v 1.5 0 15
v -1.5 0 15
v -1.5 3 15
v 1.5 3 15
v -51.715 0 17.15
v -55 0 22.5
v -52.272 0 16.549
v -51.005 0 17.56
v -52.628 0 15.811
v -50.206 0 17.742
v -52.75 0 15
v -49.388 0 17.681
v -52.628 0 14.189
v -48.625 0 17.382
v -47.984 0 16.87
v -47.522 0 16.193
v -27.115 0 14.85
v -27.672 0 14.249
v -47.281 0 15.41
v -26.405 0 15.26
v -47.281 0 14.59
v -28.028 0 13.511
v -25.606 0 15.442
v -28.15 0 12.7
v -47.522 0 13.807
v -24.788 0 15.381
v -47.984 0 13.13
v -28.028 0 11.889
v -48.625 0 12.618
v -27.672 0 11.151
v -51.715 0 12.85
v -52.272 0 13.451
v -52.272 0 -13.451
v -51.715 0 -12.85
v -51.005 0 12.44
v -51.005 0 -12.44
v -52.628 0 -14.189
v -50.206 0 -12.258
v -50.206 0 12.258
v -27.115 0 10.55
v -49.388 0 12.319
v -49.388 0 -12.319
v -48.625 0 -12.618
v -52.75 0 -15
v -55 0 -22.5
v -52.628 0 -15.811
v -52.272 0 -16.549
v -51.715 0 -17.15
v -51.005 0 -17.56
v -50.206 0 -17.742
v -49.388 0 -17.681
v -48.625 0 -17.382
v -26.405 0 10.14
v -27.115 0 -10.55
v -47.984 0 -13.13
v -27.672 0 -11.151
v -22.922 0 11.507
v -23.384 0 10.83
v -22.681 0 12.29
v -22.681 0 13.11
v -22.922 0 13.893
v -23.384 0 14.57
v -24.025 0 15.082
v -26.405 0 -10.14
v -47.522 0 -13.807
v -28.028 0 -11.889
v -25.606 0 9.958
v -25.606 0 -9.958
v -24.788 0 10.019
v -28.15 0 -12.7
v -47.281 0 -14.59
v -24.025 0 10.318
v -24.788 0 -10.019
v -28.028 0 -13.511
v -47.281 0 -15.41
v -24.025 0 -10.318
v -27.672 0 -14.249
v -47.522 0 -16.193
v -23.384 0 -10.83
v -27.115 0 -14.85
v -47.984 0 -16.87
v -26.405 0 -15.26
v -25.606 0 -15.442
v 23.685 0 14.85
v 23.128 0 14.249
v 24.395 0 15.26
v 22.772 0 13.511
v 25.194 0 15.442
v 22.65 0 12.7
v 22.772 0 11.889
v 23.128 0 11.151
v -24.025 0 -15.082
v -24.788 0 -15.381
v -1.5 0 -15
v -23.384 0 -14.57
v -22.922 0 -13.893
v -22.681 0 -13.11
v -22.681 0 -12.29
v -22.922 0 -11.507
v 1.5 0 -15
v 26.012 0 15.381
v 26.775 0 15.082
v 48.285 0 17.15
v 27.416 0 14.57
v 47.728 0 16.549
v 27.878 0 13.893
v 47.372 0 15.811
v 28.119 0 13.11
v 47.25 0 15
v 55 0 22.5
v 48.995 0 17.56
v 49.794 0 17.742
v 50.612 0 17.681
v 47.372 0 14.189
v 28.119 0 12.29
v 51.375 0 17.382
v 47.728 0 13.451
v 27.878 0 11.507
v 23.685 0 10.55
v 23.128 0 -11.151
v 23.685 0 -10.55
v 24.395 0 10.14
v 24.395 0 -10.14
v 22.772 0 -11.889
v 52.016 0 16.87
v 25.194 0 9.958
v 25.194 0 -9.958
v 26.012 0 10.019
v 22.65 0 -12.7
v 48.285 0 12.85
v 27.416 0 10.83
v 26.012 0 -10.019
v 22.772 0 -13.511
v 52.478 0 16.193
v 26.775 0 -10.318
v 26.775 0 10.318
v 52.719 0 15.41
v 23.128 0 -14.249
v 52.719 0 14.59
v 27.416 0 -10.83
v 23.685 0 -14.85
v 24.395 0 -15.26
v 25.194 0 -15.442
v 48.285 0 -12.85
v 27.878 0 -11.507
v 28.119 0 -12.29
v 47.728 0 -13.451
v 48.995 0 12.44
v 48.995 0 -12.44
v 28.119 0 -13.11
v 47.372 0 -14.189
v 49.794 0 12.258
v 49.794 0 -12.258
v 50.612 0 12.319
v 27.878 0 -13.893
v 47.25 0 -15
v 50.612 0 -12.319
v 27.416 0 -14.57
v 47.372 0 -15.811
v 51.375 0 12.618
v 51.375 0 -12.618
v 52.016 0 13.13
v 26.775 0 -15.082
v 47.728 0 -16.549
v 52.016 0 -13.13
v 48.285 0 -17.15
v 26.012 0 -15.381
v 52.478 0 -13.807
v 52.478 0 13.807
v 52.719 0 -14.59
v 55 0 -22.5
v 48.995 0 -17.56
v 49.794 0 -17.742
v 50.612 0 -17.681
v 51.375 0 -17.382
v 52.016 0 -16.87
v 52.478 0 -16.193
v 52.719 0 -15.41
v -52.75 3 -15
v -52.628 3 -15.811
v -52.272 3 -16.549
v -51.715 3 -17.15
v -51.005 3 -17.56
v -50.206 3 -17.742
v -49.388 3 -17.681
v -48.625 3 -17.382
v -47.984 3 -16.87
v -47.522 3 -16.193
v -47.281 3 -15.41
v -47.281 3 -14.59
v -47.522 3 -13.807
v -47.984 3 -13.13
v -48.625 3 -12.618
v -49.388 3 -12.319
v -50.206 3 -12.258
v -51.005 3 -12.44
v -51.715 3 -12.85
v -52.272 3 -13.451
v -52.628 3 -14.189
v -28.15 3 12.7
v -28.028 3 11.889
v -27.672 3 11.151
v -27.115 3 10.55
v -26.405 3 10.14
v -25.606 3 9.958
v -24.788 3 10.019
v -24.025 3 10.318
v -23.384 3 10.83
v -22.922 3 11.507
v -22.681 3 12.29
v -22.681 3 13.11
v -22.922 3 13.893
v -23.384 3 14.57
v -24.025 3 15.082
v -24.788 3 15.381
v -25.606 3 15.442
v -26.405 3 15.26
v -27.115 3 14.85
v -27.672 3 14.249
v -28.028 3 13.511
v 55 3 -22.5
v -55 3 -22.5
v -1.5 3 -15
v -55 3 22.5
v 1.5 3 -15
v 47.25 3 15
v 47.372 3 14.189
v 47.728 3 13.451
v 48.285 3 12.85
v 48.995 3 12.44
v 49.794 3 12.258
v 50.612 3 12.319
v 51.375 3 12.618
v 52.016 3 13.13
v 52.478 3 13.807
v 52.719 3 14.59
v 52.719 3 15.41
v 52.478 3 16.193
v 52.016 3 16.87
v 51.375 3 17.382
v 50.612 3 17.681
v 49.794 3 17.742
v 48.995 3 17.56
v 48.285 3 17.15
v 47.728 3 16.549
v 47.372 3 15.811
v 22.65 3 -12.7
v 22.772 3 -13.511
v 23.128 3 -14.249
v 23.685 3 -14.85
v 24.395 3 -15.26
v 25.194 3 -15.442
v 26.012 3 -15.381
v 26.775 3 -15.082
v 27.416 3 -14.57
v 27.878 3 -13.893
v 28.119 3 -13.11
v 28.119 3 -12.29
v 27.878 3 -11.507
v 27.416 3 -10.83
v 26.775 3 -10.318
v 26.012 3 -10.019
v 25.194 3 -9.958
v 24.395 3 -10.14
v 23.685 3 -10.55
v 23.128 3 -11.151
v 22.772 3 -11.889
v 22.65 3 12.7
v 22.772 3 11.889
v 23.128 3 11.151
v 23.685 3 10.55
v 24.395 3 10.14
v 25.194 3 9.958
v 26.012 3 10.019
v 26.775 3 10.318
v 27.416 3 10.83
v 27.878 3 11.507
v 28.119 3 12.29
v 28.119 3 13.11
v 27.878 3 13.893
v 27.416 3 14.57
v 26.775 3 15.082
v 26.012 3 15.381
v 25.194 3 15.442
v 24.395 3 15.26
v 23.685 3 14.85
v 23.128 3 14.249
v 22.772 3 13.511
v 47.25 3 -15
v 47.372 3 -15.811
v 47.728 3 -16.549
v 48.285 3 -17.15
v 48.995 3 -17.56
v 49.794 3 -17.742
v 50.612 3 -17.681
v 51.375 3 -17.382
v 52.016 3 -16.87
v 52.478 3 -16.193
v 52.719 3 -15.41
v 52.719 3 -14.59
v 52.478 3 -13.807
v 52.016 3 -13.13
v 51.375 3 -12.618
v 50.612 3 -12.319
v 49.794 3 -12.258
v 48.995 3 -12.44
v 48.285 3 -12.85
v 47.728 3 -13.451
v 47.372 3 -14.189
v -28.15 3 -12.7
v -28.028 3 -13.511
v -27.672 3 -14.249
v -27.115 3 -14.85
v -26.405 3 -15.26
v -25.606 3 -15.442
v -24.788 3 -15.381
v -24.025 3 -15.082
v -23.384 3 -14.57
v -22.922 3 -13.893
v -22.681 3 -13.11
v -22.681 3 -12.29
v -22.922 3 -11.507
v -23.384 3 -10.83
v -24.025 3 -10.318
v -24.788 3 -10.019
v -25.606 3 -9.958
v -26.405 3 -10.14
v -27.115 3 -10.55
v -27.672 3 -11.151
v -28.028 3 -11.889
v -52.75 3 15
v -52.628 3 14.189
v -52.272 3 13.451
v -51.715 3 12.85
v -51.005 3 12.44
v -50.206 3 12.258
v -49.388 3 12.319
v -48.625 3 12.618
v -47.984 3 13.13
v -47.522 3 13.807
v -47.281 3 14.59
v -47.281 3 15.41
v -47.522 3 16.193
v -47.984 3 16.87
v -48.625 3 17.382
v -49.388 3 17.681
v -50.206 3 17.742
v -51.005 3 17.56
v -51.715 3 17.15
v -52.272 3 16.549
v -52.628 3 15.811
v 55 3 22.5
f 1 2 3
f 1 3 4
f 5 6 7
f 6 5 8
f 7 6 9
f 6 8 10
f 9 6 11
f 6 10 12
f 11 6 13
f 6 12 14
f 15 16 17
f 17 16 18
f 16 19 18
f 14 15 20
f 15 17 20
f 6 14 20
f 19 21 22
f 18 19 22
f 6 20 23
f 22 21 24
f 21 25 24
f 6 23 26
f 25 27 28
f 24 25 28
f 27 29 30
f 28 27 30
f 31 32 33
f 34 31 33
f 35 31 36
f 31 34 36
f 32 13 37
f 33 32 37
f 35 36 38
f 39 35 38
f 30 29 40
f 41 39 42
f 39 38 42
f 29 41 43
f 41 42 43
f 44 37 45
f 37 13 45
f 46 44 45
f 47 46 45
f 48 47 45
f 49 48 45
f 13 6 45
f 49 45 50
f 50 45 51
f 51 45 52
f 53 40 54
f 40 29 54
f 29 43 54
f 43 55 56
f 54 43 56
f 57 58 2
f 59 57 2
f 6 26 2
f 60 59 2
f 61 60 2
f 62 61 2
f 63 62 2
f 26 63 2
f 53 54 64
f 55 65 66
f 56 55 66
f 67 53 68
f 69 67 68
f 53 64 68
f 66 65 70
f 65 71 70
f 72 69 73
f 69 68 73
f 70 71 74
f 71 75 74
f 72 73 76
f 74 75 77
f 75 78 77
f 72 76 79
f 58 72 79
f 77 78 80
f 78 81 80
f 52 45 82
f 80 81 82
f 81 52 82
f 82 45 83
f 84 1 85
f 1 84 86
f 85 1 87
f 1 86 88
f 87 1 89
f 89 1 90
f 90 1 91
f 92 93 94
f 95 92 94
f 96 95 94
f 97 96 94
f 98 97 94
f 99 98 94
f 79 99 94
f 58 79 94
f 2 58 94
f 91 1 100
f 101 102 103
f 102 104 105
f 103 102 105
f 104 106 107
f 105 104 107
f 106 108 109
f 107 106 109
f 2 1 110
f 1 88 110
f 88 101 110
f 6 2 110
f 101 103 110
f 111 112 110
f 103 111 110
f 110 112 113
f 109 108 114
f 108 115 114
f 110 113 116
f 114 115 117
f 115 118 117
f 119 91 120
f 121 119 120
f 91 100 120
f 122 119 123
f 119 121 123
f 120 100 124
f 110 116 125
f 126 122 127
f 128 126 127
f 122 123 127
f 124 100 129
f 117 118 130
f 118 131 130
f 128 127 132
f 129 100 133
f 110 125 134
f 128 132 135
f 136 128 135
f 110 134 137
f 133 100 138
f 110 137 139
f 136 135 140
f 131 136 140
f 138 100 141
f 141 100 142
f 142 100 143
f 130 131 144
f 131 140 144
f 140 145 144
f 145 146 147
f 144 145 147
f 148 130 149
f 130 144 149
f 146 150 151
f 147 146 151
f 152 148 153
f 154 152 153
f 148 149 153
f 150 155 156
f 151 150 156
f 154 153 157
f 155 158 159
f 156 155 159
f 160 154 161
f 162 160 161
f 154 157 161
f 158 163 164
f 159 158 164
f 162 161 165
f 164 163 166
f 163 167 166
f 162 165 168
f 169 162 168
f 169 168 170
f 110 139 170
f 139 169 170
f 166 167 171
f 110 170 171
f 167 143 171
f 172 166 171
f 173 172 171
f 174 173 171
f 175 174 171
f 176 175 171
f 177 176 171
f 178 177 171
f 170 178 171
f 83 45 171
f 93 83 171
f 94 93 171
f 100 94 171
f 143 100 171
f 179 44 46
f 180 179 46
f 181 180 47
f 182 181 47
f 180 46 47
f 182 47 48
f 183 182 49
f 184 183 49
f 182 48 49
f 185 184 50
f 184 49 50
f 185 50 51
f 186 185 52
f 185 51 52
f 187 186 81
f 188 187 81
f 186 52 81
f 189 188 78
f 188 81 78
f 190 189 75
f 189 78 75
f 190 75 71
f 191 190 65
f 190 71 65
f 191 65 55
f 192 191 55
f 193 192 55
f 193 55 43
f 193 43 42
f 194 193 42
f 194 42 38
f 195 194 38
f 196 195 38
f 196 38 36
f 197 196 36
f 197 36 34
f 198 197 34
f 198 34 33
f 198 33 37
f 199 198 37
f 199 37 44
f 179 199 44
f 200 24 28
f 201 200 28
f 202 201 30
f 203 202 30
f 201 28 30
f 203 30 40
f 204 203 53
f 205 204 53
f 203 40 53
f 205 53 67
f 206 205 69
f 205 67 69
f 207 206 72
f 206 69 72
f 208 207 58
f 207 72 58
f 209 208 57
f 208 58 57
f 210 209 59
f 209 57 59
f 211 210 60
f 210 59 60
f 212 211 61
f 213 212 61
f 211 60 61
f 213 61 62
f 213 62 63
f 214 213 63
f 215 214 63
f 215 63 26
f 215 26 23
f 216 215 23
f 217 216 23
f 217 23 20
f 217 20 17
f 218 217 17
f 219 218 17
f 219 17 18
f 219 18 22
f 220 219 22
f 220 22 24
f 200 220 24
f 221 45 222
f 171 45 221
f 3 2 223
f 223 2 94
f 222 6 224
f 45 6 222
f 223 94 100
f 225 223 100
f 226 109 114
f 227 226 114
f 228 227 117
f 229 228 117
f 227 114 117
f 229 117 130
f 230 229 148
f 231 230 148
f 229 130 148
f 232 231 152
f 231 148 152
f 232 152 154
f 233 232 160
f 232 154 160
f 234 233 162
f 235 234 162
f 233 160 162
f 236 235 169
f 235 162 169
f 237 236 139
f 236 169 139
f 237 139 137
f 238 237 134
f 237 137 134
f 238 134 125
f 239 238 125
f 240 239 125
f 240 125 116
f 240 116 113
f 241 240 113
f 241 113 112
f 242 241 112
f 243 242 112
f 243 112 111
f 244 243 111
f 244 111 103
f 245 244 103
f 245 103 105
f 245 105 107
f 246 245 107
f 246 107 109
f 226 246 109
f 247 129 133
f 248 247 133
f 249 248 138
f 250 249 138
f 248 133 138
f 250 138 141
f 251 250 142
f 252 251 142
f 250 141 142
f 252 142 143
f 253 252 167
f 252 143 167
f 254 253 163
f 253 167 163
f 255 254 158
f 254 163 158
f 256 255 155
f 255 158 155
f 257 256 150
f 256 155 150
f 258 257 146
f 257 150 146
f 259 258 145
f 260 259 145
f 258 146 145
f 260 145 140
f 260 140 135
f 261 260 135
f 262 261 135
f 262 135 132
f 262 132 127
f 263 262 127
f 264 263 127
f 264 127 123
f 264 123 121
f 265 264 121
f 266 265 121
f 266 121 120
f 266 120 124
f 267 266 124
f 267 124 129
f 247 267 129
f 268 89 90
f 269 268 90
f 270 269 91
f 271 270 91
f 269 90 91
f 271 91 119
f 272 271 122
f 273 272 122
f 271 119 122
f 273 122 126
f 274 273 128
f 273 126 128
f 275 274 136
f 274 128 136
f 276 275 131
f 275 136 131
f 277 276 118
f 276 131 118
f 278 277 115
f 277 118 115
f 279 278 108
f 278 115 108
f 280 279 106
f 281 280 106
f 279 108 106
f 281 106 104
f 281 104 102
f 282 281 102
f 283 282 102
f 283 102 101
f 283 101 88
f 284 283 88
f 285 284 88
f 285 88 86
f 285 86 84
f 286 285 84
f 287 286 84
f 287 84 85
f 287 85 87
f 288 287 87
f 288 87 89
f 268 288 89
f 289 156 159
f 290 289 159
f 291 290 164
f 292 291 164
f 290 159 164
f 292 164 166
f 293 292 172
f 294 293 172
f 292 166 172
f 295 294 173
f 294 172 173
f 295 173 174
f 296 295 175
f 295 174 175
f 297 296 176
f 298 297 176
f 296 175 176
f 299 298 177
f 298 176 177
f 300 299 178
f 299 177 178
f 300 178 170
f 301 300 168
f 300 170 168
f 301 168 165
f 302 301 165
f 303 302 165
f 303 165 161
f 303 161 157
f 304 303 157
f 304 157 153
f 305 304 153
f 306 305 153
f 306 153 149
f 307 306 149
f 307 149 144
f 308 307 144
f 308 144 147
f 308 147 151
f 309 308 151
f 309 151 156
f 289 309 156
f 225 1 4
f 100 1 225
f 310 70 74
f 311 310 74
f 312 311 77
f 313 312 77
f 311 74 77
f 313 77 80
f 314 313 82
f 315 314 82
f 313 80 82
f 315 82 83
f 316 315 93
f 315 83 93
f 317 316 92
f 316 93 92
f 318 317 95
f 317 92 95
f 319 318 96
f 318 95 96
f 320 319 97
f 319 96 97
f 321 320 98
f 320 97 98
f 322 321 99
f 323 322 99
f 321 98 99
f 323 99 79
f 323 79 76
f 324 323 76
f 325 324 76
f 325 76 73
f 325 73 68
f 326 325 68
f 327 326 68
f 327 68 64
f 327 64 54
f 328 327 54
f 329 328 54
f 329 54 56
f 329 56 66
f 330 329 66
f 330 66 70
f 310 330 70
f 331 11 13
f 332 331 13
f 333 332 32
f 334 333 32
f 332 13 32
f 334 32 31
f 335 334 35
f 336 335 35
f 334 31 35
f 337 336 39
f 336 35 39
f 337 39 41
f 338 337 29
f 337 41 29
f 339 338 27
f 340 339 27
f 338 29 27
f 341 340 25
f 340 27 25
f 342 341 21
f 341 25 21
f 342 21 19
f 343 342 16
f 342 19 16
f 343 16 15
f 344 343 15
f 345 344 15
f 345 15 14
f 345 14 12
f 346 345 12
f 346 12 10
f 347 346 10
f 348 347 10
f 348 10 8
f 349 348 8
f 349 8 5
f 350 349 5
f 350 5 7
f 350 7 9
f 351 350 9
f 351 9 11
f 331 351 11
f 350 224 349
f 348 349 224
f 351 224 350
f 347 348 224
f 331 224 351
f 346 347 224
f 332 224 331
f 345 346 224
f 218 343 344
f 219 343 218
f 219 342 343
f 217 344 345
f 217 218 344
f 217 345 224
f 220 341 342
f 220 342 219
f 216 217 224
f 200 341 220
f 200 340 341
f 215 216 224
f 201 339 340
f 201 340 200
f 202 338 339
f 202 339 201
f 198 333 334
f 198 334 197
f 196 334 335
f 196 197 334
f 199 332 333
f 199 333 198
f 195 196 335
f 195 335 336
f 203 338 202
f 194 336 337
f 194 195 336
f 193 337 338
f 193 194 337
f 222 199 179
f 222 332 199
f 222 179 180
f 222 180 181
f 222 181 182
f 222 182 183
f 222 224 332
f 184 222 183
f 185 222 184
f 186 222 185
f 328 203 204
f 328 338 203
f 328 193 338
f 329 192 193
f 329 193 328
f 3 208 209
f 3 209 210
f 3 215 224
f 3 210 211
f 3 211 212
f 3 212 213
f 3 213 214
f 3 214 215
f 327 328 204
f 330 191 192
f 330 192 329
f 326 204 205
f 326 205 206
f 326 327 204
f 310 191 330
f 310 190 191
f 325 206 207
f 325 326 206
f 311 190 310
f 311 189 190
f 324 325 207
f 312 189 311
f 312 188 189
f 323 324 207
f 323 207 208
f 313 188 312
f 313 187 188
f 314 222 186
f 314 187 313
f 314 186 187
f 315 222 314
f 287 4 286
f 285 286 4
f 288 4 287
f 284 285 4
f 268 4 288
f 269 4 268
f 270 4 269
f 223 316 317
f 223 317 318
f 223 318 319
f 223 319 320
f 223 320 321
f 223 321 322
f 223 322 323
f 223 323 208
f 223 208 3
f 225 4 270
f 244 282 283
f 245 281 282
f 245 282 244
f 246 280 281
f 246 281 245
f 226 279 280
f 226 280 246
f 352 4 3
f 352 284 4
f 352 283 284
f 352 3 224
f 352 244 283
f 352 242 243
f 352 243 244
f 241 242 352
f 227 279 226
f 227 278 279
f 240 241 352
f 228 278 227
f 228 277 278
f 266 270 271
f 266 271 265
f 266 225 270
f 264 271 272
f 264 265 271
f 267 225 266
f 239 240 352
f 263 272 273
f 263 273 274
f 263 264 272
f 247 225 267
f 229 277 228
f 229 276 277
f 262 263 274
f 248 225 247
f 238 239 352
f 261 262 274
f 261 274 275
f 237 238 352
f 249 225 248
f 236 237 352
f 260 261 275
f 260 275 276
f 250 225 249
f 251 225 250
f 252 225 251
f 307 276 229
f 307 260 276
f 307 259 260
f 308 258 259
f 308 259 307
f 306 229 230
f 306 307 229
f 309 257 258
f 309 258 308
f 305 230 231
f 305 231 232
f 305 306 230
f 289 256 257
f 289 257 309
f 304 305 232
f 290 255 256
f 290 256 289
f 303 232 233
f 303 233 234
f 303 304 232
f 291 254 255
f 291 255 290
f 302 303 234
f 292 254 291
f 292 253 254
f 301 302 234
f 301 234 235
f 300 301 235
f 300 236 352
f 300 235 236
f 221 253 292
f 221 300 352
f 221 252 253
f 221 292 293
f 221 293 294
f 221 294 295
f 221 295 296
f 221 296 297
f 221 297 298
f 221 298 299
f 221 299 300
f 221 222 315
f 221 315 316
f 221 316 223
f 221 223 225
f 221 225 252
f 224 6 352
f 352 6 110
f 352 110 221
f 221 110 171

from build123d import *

# Parameters (mm, degrees)
SKETCH1_W                = 110
SKETCH1_H                = 45
SKETCH1_W_2              = 3
SKETCH1_H_2              = 30
BOSS_EXTRUDE1_DEPTH      = 3
M5_CLEARANCE_HOLE2_D     = 5.5
M5_CLEARANCE_HOLE2_DEPTH = 12.4
M5_CLEARANCE_HOLE2_TIP   = 1.652366702
M5_CLEARANCE_HOLE3_D     = 5.5


with BuildPart() as part:
    # Sketch1 → Boss-Extrude1 (new body)
    with BuildSketch(Plane(origin=(0, 0, 0), x_dir=(1, 0, 0), z_dir=(0, 1, 0))):
        Rectangle(SKETCH1_W, SKETCH1_H)
        Rectangle(SKETCH1_W_2, SKETCH1_H_2, mode=Mode.SUBTRACT)
    extrude(amount=BOSS_EXTRUDE1_DEPTH)

    # M5 Clearance Hole2
    with Locations(Plane(origin=(0, 3, 0), x_dir=(1, 0, 0), z_dir=(0, 1, 0))):
        with Locations((50, 15), (-50, -15), (-50, 15), (50, -15)):
            Hole(M5_CLEARANCE_HOLE2_D / 2, depth=M5_CLEARANCE_HOLE2_DEPTH)
            with Locations((0, 0, -(M5_CLEARANCE_HOLE2_DEPTH + M5_CLEARANCE_HOLE2_TIP / 2))):  # 118° drill point
                Cone(0, M5_CLEARANCE_HOLE2_D / 2, M5_CLEARANCE_HOLE2_TIP, mode=Mode.SUBTRACT)

    # M5 Clearance Hole3 (through all)
    with Locations(Plane(origin=(0, 3, 0), x_dir=(1, 0, 0), z_dir=(0, 1, 0))):
        with Locations((-25.4, -12.7), (25.4, 12.7), (-25.4, 12.7), (25.4, -12.7)):
            Hole(M5_CLEARANCE_HOLE3_D / 2)


solid = part.part
